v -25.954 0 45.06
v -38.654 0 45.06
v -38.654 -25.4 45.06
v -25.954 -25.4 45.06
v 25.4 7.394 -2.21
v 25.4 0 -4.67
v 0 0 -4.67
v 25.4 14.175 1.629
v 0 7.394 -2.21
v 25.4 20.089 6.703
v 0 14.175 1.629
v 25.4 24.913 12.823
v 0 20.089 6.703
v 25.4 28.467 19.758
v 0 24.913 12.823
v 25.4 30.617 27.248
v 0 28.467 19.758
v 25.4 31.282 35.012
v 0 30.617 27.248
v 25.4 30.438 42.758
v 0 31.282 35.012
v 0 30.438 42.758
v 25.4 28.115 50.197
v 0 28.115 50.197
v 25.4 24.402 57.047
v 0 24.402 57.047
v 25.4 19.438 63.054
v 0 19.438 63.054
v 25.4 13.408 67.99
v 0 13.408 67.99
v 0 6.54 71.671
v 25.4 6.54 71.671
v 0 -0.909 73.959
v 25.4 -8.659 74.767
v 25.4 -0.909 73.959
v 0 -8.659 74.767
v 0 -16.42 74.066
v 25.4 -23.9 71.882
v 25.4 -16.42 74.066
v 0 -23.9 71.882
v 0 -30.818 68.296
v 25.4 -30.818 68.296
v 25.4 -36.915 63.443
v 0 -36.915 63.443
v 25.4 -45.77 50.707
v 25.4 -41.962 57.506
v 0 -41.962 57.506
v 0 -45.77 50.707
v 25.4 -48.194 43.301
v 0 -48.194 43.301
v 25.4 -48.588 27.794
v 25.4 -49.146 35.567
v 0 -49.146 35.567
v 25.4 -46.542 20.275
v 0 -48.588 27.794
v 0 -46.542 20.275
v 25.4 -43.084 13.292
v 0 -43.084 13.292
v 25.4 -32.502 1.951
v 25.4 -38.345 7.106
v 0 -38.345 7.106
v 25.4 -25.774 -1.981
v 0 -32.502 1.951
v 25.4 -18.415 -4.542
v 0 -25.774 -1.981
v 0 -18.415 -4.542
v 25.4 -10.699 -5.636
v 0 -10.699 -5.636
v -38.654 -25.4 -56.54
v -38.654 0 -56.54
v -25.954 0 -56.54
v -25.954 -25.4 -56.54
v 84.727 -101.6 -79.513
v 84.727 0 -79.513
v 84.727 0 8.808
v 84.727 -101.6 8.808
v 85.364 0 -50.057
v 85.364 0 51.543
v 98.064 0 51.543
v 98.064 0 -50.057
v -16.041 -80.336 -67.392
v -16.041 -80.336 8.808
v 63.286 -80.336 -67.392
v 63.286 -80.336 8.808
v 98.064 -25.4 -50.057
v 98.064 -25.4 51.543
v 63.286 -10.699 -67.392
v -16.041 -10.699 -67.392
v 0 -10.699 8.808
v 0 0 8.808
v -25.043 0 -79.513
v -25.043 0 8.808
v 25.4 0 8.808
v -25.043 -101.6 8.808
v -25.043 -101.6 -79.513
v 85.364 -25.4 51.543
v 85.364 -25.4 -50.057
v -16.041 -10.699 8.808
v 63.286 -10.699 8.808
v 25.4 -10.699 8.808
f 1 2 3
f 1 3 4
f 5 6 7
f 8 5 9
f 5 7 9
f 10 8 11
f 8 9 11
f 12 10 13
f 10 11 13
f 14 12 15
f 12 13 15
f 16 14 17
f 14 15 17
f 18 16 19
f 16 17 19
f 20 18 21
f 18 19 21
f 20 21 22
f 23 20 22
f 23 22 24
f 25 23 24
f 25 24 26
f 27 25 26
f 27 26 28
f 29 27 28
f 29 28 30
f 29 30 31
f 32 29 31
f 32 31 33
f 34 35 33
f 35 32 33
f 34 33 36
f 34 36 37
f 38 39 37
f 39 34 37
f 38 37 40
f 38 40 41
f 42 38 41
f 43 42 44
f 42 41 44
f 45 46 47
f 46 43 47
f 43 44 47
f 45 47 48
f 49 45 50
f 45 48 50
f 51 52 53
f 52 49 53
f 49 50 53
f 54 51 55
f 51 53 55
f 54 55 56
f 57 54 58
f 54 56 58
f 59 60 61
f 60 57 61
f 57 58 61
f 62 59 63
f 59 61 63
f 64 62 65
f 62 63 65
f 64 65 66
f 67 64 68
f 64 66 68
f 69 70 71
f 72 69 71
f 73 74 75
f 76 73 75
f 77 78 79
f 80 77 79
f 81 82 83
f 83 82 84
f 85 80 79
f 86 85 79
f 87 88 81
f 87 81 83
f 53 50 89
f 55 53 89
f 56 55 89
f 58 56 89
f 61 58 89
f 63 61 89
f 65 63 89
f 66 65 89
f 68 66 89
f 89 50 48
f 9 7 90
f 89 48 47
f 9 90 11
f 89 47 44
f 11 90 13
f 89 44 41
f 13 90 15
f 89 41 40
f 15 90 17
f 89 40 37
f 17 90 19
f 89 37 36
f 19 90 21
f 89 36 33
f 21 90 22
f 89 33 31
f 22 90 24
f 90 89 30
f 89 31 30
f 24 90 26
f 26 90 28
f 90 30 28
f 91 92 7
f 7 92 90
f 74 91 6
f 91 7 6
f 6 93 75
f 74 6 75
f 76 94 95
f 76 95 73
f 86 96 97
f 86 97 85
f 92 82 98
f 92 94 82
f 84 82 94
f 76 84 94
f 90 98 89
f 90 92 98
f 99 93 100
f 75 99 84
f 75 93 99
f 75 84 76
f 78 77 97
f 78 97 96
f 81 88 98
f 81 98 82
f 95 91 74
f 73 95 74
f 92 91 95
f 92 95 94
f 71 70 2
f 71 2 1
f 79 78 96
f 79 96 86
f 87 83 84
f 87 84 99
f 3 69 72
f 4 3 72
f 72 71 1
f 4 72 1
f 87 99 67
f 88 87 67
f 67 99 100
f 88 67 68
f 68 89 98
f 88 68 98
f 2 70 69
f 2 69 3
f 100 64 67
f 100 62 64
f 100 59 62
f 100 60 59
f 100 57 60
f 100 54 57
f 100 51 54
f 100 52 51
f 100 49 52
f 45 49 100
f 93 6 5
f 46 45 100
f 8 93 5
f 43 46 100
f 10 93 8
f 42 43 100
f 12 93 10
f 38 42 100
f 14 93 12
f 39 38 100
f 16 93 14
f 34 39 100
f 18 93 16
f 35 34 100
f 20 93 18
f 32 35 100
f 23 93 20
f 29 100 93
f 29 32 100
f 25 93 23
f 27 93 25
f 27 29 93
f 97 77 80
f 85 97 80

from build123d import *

# Parameters (mm, degrees)
F0_W     = 109.7702998668
F0_H     = 88.3209286258
F1_DEPTH = 101.6
F3_DEPTH = 76.2
F4_W     = 12.7
F4_H     = 101.6
F5_DEPTH = 25.4
F6_R     = 40.221719965
F7_DEPTH = 25.4


with BuildPart() as f1:
    # F0 (on Front) → F1 (new body)
    with BuildSketch(Plane.XZ):
        with Locations((29.8420181498, -35.3527204134)):
            Rectangle(F0_W, F0_H)
    extrude(amount=F1_DEPTH)

    # F2 (on face) → F3 (cut)
    with BuildSketch(Plane.XY.offset(8.8077438995)):
        Polygon((63.2861107588, -10.6992227957), (-16.0411931574, -10.6992227957), (-16.0411931574, -80.335855484), (63.2861107588, -80.335855484), (63.2861107588, -18.5826886445), align=None)
    extrude(amount=-F3_DEPTH, mode=Mode.SUBTRACT)

    # F6 (on Right) → F7 (join)
    with BuildSketch(Plane.YZ):
        with Locations((-8.9369295165, 34.5467254519)):
            Circle(F6_R)
    extrude(amount=F7_DEPTH)


with BuildPart() as f5:
    # F4 (on Front) → F5 (new body)
    with BuildSketch(Plane.XZ):
        with Locations((-32.3043470117, -5.7396613061)):
            Rectangle(F4_W, F4_H)
    extrude(amount=F5_DEPTH)


with BuildPart() as f5b:
    # F4 (on Front) → F5, piece 2 (new body)
    with BuildSketch(Plane.XZ):
        with Locations((91.7142001748, 0.7425590038)):
            Rectangle(F4_W, F4_H)
    extrude(amount=F5_DEPTH)


solid = Compound([f1.part, f5.part, f5b.part])
